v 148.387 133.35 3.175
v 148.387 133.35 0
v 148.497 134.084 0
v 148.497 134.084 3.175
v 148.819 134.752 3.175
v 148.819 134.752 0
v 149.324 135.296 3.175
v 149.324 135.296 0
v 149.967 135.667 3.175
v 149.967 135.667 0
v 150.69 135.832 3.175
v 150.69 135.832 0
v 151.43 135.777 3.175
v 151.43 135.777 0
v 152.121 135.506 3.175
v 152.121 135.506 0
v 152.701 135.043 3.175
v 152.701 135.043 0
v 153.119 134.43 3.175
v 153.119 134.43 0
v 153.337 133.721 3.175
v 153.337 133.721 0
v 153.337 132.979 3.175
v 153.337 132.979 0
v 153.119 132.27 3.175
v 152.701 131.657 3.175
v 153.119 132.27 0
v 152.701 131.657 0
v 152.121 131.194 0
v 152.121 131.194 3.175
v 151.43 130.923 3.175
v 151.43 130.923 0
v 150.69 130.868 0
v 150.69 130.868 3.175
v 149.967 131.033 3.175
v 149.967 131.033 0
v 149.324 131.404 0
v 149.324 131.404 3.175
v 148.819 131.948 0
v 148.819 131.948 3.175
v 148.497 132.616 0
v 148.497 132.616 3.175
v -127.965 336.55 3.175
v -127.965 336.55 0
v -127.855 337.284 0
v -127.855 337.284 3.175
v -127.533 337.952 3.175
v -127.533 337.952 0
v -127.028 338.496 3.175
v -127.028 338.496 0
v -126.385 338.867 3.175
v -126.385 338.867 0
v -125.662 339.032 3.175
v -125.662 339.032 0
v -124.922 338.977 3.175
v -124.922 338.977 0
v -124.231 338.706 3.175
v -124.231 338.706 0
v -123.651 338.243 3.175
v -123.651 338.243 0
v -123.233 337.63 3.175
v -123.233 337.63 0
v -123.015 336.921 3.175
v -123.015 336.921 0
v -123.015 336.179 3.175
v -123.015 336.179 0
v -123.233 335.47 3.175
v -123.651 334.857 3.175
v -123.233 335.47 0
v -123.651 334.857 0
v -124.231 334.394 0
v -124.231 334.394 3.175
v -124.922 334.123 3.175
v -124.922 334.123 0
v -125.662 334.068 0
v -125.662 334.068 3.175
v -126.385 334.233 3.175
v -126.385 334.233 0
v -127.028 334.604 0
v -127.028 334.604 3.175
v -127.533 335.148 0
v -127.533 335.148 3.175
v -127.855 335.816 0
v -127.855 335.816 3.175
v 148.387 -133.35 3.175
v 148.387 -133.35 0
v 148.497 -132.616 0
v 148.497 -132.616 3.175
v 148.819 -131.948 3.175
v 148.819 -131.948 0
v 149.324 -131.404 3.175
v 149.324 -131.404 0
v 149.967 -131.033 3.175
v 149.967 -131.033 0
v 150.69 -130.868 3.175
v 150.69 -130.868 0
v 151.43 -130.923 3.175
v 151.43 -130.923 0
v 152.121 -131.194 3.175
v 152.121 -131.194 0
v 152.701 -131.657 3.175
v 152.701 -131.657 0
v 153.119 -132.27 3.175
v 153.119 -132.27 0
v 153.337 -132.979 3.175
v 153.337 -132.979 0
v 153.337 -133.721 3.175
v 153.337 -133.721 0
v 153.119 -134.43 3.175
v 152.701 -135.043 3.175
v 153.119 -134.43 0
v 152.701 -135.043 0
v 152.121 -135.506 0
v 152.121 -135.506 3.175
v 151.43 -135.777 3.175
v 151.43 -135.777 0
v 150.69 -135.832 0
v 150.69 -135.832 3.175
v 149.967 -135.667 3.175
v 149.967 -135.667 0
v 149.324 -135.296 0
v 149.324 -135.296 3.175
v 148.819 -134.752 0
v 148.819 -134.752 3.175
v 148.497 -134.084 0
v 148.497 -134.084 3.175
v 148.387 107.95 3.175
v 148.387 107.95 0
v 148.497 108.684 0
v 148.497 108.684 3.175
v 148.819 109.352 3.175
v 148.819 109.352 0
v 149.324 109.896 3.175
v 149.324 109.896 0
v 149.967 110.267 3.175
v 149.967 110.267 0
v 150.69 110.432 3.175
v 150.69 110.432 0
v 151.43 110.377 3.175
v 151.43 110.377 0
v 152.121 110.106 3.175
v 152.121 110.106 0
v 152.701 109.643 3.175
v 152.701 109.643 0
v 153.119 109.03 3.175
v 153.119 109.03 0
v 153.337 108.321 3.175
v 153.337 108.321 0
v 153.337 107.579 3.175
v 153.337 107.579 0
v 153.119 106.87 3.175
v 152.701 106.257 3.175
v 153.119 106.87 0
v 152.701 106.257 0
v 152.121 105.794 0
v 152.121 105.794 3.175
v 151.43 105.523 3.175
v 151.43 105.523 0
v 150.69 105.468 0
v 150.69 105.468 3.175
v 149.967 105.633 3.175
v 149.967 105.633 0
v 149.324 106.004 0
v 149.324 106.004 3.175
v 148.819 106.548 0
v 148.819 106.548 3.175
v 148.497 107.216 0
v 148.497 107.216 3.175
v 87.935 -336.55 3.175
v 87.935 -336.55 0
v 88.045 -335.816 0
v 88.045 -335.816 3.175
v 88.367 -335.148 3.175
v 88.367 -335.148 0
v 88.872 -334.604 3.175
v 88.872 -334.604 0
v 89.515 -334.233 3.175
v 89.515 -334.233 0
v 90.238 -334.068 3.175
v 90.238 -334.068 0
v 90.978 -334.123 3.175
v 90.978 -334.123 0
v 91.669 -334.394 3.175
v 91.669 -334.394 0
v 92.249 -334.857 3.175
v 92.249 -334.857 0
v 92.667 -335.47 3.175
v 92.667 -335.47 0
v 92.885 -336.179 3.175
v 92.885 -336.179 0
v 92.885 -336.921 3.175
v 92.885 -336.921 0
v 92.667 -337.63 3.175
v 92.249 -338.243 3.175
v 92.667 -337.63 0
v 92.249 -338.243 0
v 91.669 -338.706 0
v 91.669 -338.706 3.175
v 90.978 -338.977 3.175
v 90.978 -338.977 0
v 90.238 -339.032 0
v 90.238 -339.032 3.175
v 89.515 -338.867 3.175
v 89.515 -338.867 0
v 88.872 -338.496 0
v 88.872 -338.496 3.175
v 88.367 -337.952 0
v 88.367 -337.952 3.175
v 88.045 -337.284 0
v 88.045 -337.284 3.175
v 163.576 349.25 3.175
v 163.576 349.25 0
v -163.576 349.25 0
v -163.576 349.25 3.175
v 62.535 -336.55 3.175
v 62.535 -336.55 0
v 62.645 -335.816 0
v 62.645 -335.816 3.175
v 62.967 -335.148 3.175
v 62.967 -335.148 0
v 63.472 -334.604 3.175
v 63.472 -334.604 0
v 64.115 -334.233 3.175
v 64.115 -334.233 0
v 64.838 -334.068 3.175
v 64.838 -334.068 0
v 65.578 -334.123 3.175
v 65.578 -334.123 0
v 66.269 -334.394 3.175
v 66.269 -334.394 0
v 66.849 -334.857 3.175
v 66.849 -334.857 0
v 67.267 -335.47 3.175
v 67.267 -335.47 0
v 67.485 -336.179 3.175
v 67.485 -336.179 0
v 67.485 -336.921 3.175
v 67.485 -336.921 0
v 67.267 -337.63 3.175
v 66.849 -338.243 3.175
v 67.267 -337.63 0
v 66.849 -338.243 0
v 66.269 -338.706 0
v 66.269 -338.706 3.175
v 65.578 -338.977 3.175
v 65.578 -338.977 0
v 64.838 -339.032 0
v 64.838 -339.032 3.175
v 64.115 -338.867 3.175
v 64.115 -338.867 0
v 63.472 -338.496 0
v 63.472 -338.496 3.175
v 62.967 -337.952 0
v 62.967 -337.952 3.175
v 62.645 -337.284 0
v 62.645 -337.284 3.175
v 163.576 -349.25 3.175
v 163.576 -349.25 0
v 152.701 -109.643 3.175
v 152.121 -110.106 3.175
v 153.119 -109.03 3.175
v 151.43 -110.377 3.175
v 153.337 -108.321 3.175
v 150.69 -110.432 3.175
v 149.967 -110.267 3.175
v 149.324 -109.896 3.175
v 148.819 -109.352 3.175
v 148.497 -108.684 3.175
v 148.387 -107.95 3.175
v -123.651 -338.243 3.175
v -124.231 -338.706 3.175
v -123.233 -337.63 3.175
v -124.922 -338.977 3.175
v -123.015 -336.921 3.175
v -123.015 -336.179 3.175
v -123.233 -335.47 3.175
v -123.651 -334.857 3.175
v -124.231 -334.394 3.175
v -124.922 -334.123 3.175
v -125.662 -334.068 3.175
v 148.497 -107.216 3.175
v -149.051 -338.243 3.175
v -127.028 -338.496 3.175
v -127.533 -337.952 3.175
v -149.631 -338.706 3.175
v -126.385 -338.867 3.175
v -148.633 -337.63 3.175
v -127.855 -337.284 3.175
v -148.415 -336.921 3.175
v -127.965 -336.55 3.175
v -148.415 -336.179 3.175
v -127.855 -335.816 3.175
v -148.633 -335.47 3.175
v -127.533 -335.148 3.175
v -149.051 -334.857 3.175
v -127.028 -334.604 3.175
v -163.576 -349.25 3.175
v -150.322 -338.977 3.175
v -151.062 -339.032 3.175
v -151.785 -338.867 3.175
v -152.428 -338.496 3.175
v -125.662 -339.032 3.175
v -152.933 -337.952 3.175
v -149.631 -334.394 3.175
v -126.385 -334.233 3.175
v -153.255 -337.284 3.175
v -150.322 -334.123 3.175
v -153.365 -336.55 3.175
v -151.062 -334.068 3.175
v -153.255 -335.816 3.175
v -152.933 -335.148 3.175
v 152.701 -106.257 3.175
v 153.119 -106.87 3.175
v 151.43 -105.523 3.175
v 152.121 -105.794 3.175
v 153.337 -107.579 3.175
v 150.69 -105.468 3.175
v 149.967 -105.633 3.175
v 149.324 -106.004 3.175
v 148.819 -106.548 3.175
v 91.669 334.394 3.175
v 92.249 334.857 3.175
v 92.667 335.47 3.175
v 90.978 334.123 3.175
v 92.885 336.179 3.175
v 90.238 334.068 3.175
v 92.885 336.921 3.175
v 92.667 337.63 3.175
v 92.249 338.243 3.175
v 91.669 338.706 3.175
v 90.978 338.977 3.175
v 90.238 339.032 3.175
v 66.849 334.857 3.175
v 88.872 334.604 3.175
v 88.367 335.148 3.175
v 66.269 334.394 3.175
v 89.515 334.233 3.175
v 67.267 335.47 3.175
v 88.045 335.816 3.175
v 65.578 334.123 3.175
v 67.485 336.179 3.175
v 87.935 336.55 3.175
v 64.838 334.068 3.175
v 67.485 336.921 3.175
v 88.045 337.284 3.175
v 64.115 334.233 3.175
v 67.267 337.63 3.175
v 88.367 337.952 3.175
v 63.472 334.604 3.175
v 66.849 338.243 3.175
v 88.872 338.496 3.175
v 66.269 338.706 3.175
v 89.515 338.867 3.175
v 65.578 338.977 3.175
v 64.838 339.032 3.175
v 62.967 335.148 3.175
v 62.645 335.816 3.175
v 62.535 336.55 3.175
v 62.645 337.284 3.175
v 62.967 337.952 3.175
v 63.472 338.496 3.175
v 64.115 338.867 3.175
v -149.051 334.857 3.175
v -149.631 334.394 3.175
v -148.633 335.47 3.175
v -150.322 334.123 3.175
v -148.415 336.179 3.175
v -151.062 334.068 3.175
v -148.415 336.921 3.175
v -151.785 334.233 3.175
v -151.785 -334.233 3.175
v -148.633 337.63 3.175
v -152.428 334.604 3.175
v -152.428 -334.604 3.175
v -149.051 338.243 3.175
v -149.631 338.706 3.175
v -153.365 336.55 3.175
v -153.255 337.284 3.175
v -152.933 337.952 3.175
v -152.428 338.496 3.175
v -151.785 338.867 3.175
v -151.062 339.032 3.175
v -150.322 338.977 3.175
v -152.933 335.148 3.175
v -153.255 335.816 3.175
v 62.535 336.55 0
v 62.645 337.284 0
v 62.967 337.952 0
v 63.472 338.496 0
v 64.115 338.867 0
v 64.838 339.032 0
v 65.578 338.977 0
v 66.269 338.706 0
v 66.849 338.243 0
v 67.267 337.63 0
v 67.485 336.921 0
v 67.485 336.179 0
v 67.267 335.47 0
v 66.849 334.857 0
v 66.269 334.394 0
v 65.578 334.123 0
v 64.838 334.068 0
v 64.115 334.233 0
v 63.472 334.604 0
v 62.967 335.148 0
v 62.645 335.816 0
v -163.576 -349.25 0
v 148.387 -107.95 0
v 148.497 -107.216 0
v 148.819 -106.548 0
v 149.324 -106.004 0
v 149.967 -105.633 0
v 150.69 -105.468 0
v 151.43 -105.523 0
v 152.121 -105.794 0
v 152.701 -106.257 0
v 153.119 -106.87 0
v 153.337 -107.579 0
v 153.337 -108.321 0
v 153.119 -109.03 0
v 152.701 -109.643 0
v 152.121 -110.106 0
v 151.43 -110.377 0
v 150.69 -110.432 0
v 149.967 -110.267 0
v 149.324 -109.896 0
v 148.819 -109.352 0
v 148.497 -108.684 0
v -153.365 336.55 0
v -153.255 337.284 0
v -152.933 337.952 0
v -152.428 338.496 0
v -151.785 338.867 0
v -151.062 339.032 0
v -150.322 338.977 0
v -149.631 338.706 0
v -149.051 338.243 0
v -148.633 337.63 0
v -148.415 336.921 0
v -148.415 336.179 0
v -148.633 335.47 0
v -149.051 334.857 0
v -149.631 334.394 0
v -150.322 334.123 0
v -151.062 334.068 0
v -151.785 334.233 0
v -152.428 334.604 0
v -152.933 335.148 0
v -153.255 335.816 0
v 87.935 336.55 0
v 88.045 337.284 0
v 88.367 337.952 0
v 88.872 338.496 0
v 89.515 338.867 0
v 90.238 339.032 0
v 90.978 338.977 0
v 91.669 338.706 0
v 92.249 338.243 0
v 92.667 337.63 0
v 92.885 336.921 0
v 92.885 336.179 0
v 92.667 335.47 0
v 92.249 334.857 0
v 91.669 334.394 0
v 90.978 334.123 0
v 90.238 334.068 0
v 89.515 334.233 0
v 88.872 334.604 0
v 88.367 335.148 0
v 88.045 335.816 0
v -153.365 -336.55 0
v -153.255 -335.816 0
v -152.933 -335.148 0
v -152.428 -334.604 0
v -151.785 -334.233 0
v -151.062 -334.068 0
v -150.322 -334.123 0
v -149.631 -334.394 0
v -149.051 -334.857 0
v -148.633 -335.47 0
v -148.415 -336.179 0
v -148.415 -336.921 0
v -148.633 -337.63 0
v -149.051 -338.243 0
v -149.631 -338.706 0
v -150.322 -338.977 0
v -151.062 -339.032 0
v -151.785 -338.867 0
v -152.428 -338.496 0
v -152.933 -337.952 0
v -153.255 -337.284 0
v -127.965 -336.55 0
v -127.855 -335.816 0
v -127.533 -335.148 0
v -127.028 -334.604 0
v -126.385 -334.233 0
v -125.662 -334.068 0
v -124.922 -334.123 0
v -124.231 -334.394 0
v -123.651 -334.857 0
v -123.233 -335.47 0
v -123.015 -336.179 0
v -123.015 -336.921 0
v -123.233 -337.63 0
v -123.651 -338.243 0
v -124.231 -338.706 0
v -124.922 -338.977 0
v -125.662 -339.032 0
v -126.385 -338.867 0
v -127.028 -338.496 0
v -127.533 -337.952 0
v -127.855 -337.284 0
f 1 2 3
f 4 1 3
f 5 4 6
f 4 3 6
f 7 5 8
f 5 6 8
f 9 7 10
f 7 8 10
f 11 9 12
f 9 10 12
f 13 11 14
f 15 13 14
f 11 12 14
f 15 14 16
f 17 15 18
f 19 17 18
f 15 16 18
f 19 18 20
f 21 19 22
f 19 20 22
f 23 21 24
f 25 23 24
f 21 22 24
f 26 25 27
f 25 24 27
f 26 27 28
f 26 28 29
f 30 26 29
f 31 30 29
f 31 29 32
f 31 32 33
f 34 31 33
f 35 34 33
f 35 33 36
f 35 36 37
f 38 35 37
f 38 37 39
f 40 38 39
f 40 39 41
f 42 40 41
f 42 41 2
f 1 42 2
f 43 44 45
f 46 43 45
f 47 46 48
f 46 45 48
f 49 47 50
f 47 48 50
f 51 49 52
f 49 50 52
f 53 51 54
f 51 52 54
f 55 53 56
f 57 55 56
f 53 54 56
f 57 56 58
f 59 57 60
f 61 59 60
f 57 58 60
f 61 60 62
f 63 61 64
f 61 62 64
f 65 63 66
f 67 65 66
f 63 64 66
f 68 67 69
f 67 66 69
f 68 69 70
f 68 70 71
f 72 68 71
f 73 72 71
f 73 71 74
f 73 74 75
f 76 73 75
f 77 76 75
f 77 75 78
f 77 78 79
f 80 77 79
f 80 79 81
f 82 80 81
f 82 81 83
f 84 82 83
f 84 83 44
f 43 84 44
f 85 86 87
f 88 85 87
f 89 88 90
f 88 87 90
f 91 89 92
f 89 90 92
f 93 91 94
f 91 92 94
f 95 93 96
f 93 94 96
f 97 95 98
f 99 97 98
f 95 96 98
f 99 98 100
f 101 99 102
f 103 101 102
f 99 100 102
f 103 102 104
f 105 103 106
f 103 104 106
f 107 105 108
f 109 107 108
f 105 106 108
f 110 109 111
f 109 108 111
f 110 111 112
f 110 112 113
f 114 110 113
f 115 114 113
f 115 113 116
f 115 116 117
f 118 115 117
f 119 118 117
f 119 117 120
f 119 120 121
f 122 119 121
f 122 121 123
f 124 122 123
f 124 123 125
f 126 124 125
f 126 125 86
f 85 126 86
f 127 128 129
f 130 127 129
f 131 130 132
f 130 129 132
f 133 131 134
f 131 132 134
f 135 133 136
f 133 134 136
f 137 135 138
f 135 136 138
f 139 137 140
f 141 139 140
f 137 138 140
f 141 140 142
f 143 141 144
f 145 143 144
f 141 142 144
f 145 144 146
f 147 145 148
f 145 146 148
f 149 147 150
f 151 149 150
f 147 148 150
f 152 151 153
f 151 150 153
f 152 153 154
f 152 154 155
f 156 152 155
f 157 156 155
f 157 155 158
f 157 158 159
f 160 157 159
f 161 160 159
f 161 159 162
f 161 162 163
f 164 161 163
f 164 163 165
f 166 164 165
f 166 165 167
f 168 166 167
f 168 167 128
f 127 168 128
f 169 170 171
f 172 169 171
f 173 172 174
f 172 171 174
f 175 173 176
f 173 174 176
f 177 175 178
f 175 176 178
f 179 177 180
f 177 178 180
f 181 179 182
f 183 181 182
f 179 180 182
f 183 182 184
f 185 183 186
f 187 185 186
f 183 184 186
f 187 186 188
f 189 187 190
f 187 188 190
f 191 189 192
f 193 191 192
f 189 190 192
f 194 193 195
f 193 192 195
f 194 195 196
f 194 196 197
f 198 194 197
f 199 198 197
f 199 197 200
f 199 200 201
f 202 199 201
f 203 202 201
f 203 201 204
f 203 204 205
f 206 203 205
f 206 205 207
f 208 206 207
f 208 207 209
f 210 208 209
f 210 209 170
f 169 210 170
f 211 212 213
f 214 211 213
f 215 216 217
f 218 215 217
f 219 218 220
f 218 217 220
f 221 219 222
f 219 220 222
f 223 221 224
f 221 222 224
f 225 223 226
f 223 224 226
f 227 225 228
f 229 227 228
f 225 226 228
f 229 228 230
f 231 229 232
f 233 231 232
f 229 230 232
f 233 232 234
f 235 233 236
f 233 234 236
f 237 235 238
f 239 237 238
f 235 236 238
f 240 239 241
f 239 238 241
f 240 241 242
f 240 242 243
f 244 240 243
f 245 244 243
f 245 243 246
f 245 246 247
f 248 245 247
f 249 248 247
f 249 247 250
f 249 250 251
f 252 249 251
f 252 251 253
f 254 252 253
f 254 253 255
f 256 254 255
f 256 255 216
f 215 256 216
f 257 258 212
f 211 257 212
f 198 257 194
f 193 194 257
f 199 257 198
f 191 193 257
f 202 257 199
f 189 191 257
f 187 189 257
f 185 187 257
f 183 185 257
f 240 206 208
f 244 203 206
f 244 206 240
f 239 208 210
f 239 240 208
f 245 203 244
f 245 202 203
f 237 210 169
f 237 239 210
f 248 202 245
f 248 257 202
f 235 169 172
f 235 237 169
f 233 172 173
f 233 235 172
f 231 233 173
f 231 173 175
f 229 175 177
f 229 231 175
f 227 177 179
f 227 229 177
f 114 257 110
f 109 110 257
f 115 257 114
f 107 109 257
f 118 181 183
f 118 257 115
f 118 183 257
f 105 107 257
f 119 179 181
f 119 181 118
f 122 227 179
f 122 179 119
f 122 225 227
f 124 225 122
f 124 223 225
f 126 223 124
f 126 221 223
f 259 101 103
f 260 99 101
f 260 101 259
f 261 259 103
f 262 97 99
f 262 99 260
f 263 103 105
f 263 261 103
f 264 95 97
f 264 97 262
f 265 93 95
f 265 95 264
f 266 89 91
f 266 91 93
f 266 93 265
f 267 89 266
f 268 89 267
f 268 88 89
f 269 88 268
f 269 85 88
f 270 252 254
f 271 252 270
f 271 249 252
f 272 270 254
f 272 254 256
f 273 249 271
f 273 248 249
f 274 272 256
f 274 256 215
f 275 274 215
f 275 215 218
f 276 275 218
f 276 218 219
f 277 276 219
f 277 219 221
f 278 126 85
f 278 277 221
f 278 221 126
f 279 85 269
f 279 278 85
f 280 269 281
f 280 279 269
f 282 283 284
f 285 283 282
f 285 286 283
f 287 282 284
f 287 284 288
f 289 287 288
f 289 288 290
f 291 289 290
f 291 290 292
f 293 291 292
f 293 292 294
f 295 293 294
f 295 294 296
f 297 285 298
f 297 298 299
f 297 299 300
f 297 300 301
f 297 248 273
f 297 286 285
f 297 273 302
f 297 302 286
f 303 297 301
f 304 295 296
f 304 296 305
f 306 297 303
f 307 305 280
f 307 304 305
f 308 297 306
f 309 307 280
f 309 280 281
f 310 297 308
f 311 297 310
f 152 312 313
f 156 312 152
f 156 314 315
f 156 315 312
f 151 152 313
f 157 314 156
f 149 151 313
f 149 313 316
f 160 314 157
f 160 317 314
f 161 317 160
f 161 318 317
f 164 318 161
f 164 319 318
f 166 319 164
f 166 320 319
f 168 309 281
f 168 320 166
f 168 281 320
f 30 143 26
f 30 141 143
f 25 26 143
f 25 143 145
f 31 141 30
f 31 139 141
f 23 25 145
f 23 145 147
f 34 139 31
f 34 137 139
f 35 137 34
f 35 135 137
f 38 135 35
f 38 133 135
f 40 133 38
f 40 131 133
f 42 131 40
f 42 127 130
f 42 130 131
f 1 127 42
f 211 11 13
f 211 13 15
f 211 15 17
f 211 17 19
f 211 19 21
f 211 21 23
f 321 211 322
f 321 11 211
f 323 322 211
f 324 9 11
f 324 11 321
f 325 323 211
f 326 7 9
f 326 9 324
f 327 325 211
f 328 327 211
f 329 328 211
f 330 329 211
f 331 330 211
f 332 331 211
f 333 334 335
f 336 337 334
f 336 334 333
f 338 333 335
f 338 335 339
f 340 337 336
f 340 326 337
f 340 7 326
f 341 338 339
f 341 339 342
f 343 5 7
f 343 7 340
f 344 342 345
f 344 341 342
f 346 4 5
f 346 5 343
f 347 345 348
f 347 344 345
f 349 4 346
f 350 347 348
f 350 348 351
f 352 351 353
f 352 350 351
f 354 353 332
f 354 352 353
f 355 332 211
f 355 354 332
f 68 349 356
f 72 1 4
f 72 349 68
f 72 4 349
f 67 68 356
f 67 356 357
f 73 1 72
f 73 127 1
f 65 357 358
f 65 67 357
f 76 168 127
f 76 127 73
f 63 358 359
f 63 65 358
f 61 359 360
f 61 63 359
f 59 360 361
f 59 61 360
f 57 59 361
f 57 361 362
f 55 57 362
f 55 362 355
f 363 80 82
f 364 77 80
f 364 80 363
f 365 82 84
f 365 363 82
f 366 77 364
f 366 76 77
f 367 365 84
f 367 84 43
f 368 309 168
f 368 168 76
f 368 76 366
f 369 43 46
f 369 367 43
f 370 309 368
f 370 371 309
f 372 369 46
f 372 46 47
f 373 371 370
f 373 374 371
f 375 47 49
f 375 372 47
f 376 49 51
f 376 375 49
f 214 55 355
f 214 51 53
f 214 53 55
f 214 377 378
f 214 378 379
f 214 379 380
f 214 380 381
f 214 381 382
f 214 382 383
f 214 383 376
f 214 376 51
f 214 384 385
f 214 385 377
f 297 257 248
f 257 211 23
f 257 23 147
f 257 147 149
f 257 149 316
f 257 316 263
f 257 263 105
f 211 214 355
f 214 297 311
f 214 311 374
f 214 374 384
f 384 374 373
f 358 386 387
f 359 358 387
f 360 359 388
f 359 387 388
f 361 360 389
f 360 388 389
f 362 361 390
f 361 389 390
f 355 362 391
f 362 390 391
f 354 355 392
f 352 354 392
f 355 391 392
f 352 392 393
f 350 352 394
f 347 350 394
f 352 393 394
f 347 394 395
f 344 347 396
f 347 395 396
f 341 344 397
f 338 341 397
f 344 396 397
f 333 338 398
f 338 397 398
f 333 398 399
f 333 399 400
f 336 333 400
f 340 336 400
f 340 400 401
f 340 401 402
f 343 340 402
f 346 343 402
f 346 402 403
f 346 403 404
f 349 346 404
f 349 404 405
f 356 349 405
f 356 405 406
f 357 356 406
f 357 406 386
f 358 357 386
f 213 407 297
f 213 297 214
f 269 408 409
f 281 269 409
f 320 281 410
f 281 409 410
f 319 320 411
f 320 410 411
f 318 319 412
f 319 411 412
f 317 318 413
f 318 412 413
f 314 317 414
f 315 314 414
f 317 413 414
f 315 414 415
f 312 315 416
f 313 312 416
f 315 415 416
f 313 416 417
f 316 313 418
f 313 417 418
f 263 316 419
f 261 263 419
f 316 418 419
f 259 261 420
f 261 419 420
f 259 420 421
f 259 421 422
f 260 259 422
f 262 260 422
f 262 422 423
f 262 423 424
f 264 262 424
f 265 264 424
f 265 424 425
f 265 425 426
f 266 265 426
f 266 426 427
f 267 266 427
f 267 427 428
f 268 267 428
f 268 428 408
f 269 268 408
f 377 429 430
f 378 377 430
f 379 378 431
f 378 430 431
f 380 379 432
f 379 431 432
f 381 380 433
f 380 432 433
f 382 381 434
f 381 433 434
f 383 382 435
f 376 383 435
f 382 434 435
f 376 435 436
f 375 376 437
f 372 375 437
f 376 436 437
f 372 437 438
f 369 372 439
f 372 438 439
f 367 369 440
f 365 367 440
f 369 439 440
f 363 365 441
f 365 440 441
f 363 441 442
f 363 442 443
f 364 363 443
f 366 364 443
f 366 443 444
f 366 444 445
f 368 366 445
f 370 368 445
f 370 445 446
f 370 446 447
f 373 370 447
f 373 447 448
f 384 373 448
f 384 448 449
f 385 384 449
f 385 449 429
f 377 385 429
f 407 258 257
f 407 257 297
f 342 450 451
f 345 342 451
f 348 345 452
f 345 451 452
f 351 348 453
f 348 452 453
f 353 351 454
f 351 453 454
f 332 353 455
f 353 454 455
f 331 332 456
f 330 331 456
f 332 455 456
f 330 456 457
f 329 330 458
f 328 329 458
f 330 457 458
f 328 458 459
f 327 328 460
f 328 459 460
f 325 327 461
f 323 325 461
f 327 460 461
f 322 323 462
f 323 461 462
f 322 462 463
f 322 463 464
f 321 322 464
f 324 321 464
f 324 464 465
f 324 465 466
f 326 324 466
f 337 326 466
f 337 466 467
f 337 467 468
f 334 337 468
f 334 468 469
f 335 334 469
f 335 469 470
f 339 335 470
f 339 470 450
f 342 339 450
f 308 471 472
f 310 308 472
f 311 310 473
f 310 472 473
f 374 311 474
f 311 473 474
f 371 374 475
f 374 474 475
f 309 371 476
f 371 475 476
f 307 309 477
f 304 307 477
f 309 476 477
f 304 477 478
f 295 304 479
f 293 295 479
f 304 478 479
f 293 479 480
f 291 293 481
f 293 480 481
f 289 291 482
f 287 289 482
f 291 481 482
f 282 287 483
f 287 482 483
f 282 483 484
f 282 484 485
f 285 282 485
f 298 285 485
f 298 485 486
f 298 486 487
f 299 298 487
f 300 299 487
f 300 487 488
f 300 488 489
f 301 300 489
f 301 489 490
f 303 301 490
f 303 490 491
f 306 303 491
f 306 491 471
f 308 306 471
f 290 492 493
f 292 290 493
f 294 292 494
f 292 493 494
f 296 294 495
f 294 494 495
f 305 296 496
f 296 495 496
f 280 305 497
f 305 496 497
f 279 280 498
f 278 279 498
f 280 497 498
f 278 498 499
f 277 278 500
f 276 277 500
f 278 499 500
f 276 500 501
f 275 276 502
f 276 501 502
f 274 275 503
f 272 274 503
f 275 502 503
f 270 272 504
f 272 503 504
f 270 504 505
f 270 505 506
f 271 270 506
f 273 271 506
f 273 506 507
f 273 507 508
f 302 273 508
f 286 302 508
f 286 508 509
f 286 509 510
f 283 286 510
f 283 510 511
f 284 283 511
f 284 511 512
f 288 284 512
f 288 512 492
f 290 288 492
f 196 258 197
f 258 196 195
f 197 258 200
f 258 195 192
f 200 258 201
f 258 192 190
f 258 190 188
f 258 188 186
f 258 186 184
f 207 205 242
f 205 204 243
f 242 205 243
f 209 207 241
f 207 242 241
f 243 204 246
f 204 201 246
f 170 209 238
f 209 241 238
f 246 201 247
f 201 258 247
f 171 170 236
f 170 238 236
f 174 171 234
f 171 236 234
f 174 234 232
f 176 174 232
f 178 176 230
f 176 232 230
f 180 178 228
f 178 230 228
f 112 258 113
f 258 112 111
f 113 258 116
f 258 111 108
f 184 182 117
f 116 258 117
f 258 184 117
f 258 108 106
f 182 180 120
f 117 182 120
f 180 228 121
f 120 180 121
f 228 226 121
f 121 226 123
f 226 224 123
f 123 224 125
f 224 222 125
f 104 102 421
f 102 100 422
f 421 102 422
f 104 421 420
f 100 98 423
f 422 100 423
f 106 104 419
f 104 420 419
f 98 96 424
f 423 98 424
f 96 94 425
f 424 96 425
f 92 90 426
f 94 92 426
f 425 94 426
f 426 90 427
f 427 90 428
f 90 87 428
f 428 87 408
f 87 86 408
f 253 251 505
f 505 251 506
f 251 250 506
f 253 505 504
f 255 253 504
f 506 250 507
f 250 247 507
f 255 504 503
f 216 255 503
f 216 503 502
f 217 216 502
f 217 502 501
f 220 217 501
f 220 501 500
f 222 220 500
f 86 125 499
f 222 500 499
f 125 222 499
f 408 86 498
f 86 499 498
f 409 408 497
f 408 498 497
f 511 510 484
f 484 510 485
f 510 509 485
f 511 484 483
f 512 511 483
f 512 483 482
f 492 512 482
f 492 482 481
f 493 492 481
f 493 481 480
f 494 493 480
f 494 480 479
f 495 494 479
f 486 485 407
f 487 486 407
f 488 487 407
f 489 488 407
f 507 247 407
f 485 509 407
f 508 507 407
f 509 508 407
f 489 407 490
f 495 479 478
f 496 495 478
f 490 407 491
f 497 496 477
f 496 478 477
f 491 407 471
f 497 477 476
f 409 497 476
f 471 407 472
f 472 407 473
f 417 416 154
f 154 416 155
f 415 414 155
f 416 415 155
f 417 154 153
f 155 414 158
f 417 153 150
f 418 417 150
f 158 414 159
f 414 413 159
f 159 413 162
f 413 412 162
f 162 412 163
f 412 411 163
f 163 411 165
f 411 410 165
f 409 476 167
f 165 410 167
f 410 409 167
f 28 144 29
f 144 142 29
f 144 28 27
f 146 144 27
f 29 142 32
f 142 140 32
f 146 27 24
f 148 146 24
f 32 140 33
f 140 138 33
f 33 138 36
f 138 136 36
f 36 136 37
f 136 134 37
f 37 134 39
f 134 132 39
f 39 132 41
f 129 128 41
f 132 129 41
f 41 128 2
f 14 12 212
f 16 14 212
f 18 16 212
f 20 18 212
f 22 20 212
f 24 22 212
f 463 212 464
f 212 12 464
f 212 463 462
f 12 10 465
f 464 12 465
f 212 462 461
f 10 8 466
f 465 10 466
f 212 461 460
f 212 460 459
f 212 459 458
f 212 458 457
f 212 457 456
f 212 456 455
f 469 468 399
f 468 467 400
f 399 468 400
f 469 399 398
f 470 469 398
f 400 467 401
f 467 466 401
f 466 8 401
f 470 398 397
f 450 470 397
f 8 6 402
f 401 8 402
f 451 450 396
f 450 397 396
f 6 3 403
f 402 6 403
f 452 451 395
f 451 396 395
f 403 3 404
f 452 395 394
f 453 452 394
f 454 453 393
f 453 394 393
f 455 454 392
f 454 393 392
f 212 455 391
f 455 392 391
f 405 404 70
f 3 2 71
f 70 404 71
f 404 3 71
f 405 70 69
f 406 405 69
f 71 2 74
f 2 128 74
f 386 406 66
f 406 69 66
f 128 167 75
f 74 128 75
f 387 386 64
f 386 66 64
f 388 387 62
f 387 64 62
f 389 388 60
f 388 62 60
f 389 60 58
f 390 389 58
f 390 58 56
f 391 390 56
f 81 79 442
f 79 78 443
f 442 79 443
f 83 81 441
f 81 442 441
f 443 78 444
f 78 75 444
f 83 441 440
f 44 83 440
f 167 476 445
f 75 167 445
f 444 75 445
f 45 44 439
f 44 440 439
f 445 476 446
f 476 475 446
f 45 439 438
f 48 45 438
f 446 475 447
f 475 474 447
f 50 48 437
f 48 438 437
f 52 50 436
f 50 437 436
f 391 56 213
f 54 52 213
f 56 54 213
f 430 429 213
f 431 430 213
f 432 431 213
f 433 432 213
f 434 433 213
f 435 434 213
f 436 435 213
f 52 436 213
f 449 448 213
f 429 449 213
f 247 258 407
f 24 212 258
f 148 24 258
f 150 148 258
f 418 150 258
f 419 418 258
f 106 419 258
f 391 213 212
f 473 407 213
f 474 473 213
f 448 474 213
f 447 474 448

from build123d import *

# Parameters (mm, degrees)
SKETCH1_W                  = 698.5
SKETCH1_H                  = 327.152
BOSS_EXTRUDE1_DEPTH        = 3.175
F_9_0_196_DIAMETER_HOLE2_D = 4.9784


with BuildPart() as part:
    # Sketch1 → Boss-Extrude1 (new body)
    with BuildSketch(Plane(origin=(0, 0, 0), x_dir=(0, 1, 0), z_dir=(0, 0, 1))):
        Rectangle(SKETCH1_W, SKETCH1_H)
    extrude(amount=BOSS_EXTRUDE1_DEPTH)

    # #9 (0.196) Diameter Hole2 (through all)
    with Locations(Plane.XY.offset(3.175)):
        with Locations((-150.876, 336.55), (-125.476, 336.55), (65.024, 336.55), (90.424, 336.55), (90.424, -336.55), (65.024, -336.55), (-125.476, -336.55), (-150.876, -336.55), (-371.836153613, -199.719855434), (150.876, 133.35), (150.876, 107.95), (150.876, -107.95), (150.876, -133.35)):
            Hole(F_9_0_196_DIAMETER_HOLE2_D / 2)


solid = part.part
